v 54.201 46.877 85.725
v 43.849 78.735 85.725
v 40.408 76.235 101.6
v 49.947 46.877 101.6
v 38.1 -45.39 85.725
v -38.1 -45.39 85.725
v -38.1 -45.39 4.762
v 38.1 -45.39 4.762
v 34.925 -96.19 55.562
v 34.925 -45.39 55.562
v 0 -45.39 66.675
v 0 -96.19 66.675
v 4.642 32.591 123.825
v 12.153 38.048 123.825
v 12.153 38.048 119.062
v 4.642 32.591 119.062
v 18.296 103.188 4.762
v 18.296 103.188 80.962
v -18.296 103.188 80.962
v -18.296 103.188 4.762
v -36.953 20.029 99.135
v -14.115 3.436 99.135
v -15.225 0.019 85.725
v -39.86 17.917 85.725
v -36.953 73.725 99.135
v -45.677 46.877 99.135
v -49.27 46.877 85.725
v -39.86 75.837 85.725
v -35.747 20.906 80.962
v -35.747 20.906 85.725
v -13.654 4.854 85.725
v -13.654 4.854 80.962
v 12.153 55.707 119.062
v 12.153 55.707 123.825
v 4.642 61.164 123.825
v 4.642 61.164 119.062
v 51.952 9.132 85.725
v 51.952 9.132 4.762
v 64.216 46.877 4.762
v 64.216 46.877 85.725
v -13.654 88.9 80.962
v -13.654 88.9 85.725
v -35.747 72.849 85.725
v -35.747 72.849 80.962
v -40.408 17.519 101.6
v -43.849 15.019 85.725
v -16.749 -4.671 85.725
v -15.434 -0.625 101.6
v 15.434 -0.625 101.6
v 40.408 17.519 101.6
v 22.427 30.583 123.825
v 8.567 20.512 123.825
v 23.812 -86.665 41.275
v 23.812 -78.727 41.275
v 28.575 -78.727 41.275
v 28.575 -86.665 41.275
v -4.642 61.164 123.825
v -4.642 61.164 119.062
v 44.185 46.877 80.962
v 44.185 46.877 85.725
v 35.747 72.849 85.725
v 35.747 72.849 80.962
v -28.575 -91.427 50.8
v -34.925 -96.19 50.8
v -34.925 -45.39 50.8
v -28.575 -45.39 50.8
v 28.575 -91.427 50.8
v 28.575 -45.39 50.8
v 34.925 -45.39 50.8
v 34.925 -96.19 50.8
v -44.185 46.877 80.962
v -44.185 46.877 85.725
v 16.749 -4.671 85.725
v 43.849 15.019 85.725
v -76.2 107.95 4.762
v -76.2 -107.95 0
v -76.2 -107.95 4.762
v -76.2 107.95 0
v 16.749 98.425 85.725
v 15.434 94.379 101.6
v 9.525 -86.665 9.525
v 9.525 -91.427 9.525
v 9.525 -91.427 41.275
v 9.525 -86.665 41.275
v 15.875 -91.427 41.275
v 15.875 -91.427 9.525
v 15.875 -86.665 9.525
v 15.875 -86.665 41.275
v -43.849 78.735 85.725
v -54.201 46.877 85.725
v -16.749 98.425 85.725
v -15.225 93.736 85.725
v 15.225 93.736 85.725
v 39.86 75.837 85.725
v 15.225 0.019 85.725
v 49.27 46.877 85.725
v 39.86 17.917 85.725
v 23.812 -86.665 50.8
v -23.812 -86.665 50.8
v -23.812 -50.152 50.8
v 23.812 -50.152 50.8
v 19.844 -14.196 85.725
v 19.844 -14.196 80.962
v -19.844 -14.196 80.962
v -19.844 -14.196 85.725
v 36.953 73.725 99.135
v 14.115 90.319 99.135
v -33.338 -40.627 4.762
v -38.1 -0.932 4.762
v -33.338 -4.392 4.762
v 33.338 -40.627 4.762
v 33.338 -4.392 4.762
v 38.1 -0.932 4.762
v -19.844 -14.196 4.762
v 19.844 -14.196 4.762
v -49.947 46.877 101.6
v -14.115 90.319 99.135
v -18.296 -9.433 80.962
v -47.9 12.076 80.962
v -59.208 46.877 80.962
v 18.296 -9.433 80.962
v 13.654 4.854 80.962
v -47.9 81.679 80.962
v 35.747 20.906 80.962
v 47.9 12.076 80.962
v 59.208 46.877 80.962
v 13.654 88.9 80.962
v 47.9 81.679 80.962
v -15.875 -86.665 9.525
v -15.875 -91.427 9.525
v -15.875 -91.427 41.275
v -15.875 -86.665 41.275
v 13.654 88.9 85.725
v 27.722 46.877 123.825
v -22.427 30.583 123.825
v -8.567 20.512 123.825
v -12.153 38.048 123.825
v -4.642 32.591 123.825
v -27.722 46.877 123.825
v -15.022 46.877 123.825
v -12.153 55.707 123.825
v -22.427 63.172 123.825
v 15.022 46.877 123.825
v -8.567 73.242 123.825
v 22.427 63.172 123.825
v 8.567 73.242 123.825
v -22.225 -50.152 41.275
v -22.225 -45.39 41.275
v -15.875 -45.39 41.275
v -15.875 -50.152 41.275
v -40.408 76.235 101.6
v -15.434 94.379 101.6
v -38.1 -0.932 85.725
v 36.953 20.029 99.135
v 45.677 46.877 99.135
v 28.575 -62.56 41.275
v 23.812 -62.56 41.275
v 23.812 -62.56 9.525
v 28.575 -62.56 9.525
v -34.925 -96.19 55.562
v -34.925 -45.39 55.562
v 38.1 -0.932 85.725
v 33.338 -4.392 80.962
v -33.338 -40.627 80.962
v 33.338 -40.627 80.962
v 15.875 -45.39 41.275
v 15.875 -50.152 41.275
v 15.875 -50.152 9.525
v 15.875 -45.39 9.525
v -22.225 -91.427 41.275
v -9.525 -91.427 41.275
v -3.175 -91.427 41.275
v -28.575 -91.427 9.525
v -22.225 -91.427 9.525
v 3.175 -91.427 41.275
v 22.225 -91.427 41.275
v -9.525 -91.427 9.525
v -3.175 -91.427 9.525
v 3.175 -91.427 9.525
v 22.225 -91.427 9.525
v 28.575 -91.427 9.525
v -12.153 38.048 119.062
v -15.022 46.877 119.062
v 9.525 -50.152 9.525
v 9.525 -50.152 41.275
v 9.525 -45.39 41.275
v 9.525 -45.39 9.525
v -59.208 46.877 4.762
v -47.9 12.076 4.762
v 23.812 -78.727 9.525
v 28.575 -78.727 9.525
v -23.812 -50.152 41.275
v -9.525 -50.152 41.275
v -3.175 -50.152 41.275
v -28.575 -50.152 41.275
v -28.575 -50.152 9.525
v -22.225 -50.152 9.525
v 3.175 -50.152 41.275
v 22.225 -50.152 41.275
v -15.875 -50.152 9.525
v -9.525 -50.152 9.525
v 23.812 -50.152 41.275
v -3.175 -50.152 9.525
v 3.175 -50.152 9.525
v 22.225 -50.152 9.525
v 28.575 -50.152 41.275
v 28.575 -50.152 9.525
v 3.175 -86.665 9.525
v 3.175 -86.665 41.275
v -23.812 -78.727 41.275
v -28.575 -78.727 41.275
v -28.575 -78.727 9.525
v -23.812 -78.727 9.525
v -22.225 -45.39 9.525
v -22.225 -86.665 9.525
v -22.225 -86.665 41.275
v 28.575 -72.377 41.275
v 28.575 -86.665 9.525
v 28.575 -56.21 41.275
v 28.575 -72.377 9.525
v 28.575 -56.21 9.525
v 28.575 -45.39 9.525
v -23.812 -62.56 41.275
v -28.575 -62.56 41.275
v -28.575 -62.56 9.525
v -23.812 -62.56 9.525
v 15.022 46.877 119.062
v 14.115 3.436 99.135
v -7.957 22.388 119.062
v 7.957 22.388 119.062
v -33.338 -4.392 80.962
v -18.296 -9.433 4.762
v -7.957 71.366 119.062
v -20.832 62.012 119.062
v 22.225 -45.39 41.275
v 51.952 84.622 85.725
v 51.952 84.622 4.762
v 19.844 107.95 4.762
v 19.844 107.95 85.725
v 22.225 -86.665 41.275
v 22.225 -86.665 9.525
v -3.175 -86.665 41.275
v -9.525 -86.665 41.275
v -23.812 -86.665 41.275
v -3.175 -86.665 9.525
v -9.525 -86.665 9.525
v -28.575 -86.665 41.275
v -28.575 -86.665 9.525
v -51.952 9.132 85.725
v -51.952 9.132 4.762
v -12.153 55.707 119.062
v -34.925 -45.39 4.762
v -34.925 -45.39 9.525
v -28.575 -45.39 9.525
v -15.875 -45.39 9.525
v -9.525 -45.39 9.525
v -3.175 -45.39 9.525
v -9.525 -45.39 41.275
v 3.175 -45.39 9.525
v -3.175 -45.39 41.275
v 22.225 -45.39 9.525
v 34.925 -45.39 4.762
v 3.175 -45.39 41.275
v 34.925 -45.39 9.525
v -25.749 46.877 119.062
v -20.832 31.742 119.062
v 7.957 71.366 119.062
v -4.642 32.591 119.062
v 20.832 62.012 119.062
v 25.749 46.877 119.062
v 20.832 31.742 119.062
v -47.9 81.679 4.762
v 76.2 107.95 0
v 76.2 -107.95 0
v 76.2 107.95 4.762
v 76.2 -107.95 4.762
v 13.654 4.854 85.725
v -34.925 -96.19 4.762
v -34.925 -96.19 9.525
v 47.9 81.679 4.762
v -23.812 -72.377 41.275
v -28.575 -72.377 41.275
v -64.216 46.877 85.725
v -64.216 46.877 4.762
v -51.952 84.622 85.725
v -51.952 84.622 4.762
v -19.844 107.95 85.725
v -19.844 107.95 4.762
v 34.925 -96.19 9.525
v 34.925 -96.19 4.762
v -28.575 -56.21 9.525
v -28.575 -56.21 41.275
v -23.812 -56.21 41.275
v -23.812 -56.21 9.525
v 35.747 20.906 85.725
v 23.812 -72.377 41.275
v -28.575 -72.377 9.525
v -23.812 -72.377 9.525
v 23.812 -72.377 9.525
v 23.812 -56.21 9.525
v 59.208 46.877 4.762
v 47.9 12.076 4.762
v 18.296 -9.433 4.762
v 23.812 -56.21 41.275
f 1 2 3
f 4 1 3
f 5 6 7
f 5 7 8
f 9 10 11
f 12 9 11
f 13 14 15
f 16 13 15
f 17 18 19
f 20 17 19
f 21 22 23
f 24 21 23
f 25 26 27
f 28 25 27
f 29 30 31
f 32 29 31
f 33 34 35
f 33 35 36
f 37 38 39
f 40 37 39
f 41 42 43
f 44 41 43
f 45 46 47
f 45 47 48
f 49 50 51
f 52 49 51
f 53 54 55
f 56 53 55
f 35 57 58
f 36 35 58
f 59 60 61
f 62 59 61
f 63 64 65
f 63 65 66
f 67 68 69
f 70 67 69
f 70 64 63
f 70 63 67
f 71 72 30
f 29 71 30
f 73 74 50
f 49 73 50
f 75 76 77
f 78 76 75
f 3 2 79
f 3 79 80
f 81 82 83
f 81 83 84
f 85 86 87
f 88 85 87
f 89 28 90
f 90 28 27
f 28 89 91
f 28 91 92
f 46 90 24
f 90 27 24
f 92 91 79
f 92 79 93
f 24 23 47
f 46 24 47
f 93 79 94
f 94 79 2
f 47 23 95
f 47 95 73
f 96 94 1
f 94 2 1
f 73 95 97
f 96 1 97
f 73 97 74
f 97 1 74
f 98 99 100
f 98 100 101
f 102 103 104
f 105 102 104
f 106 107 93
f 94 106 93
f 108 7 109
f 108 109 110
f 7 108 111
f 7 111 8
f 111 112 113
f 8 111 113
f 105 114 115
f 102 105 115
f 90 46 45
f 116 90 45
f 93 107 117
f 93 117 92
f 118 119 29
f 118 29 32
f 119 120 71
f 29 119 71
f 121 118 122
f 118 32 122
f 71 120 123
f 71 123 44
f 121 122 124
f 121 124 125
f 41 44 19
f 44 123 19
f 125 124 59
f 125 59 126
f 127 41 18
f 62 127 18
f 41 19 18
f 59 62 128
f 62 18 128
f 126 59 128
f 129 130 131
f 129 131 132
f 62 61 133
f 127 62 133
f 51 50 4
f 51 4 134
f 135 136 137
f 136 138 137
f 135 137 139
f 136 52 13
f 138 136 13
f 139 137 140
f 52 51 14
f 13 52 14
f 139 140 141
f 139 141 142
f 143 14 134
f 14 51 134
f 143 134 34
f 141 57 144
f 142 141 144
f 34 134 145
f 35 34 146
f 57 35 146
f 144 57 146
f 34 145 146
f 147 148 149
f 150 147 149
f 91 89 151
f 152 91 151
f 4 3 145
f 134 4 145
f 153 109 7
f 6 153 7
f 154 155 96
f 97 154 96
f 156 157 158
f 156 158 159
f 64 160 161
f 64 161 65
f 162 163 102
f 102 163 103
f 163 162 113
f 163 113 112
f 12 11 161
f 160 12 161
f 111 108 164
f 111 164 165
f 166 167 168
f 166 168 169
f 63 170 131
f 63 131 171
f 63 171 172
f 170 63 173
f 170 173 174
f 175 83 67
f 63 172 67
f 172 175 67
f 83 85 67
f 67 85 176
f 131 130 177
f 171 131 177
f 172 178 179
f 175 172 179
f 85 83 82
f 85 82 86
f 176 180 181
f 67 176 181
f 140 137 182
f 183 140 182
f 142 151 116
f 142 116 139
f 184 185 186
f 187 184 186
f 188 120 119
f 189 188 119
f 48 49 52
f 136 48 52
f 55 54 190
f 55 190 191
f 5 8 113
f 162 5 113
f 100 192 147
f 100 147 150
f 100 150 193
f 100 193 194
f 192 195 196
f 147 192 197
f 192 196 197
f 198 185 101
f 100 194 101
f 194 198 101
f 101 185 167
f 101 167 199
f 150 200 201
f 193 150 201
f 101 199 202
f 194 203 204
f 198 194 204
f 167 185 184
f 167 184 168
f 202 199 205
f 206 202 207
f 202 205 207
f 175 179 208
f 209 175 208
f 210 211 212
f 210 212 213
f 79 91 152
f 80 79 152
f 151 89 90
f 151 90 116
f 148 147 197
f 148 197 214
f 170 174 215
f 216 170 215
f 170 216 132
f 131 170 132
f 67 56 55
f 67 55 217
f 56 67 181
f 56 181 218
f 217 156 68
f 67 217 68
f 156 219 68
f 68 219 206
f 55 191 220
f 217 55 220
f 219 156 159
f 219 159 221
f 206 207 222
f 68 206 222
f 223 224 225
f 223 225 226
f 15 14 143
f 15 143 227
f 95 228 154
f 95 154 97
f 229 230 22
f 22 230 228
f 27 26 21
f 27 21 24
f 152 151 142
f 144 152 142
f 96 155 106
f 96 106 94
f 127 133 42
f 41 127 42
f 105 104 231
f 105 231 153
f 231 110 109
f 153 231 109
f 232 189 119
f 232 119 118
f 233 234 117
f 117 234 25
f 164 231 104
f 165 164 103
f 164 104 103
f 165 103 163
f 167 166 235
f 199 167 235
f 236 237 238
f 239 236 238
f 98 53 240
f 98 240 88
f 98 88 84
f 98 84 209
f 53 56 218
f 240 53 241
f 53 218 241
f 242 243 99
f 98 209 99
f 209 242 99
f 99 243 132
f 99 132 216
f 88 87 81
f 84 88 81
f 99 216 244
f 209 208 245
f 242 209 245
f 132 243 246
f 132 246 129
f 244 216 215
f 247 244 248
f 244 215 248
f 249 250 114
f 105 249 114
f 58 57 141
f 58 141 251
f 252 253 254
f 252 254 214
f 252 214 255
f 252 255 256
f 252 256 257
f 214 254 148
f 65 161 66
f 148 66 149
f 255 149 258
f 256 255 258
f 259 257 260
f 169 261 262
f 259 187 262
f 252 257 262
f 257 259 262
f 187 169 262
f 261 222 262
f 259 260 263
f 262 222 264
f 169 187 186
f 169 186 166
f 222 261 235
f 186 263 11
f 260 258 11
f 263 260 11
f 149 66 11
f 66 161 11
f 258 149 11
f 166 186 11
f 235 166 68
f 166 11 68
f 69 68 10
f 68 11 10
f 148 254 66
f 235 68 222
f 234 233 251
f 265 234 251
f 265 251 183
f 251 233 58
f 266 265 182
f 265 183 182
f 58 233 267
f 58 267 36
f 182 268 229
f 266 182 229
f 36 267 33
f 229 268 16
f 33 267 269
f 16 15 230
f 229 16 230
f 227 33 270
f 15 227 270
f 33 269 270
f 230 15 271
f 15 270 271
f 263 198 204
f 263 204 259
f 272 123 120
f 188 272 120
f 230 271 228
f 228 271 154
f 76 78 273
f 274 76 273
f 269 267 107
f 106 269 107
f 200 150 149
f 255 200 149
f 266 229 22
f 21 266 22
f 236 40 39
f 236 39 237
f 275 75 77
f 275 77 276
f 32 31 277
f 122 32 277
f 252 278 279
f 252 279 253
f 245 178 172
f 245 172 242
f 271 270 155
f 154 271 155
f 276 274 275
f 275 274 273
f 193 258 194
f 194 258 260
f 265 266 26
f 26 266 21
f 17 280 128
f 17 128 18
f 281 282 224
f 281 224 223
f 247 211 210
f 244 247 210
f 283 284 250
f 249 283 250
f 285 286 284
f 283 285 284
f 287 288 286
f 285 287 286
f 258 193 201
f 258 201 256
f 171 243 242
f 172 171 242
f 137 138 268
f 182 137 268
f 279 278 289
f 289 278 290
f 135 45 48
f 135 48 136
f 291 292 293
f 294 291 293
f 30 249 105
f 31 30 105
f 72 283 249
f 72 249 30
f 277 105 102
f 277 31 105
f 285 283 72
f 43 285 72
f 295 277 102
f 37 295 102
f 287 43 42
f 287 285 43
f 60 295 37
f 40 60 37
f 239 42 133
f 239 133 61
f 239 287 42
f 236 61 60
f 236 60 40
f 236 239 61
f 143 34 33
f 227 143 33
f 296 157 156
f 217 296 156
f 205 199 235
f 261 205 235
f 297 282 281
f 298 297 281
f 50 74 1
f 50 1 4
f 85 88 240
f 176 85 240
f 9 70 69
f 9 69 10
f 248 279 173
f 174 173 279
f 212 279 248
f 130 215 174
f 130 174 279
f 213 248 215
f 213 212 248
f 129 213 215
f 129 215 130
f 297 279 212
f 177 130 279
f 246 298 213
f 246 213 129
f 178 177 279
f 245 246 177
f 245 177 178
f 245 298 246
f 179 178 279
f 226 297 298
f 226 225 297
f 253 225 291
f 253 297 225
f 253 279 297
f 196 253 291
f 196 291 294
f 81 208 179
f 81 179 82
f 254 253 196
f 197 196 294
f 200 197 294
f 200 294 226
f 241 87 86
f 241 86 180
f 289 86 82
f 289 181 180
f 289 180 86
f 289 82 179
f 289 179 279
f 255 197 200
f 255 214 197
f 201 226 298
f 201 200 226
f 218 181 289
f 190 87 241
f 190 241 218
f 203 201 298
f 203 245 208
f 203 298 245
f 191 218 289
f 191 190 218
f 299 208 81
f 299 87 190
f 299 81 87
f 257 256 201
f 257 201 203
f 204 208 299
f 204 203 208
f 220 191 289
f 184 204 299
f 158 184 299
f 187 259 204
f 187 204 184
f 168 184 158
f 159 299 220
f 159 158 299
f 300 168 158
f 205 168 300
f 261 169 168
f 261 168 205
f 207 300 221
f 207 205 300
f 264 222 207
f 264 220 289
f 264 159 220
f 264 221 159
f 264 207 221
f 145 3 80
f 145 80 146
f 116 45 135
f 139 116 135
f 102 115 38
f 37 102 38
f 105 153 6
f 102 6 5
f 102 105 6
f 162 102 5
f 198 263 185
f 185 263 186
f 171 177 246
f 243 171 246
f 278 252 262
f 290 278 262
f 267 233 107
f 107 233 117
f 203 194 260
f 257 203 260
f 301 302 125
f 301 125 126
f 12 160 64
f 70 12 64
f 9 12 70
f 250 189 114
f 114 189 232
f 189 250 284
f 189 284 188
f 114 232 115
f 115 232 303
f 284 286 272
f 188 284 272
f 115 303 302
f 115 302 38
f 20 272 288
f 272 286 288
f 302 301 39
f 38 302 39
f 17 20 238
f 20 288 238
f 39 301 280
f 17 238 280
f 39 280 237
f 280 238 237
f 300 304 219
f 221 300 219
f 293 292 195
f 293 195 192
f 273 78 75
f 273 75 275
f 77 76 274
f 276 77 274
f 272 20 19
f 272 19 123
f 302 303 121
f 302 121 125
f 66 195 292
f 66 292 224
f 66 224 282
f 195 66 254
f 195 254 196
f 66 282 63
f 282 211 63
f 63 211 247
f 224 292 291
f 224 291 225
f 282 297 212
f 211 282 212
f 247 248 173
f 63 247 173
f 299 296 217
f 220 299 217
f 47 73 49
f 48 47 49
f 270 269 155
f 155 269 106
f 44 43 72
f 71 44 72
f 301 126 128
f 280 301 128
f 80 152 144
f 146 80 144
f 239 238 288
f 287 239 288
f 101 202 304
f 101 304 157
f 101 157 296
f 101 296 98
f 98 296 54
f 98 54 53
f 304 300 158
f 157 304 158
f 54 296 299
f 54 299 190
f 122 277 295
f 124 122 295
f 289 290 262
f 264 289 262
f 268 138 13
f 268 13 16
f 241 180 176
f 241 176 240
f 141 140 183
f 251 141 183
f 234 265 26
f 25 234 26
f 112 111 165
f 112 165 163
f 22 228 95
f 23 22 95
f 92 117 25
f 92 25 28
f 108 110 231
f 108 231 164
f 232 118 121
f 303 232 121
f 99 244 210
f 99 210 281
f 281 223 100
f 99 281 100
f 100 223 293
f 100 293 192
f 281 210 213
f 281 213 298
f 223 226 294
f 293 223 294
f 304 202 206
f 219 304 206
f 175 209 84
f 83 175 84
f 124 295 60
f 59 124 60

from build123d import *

# Parameters (mm, degrees)
F0_W      = 152.4
F0_H      = 215.9
F1_DEPTH  = 4.7625
F2_W      = 69.85
F2_H      = 50.8
F3_DEPTH  = 4.7625
F4_W      = 6.35
F4_H      = 4.7625
F4_W_2    = 4.7625
F4_H_2    = 6.35
F5_DEPTH  = 31.75
F7_DEPTH  = 9.525
F9_DEPTH  = 50.8
F11_DEPTH = 80.9625
F13_DEPTH = 80.9625
F14_T     = -4.7625
F15_T     = -4.7625
F17_DEPTH = 85.726


with BuildPart() as f1:
    # F0 (on Top) → F1 (new body)
    with BuildSketch(Plane.XY):
        Rectangle(F0_W, F0_H)
    extrude(amount=F1_DEPTH)


with BuildPart() as f3:
    # F2 (on face) → F3 (new body)
    with BuildSketch(Plane.XY.offset(4.7625)):
        with Locations((0, -70.7898)):
            Rectangle(F2_W, F2_H)
    extrude(amount=F3_DEPTH)

    # F4 (on face) → F5 (join)
    with BuildSketch(Plane.XY.offset(9.525)):
        with Locations((-25.4, -47.77105)):
            Rectangle(F4_W, F4_H)
        with Locations((-12.7, -47.77105)):
            Rectangle(F4_W, F4_H)
        with Locations((0, -47.77105)):
            Rectangle(F4_W, F4_H)
        with Locations((12.7, -47.77105)):
            Rectangle(F4_W, F4_H)
        with Locations((25.4, -47.77105)):
            Rectangle(F4_W, F4_H)
        with Locations((26.19375, -59.3852)):
            Rectangle(F4_W_2, F4_H_2)
        with Locations((26.19375, -75.5523)):
            Rectangle(F4_W_2, F4_H_2)
        with Locations((25.4, -89.04605)):
            Rectangle(F4_W, F4_H)
        with Locations((12.7, -89.04605)):
            Rectangle(F4_W, F4_H)
        with Locations((0, -89.04605)):
            Rectangle(F4_W, F4_H)
        with Locations((-12.7, -89.04605)):
            Rectangle(F4_W, F4_H)
        with Locations((-25.4, -89.04605)):
            Rectangle(F4_W, F4_H)
        with Locations((-26.19375, -75.5523)):
            Rectangle(F4_W_2, F4_H_2)
        with Locations((-26.19375, -59.3852)):
            Rectangle(F4_W_2, F4_H_2)
    extrude(amount=F5_DEPTH)

    # F6 (on face) → F7 (join)
    with BuildSketch(Plane.XY.offset(41.275)):
        Polygon((28.575, -45.3898), (-28.575, -45.3898), (-28.575, -50.1523), (-23.8125, -50.1523), (-22.225, -50.1523), (23.8125, -50.1523), (23.8125, -86.6648), (28.575, -86.6648), align=None)
        Polygon((-23.8125, -50.1523), (-28.575, -50.1523), (-28.575, -91.4273), (28.575, -91.4273), (28.575, -86.6648), (23.8125, -86.6648), (22.225, -86.6648), (-23.8125, -86.6648), align=None)
    extrude(amount=F7_DEPTH)

    # F8 (on face) → F9 (join, through all)
    with BuildSketch(Plane.XZ.offset(96.1898)):
        Polygon((-34.925, 50.8), (-28.575, 50.8), (28.575, 50.8), (34.925, 50.8), (34.925, 55.5625), (0, 66.675), (-34.925, 55.5625), align=None)
    extrude(amount=-F9_DEPTH)


with BuildPart() as f11:
    # F10 (on face) → F11 (new body)
    with BuildSketch(Plane.XY.offset(4.7625)):
        Polygon((19.84375, 107.95), (-19.84375, 107.95), (-51.9516119643, 84.6222727996), (-64.2157239285, 46.8772173092), (-51.9516119643, 9.1321618187), (-19.84375, -14.1955653816), (19.84375, -14.1955653816), (51.9516119643, 9.1321618187), (64.2157239285, 46.8772173092), (51.9516119643, 84.6222727996), align=None)
    extrude(amount=F11_DEPTH)

    # F14
    f14_openings = [f11.faces().sort_by_distance(p)[0] for p in [
        (0, 46.877217, 4.7625),
    ]]
    offset(amount=F14_T, openings=f14_openings)

    # F16 (on face) → F17 (cut, through all)
    with BuildSketch(Plane.XY.offset(85.725)):
        Polygon((35.7467140651, 20.9057093044), (44.1853685568, 46.8772173092), (35.7467140651, 72.848725314), (13.6540297868, 88.9), (-13.6540297868, 88.9), (-35.7467140651, 72.848725314), (-44.1853685568, 46.8772173092), (-35.7467140651, 20.9057093044), (-13.6540297868, 4.8544346184), (13.6540297868, 4.8544346184), align=None)
    extrude(amount=-F17_DEPTH, mode=Mode.SUBTRACT)


with BuildPart() as f13:
    # F12 (on face) → F13 (new body)
    with BuildSketch(Plane.XY.offset(4.7625)):
        Polygon((19.84375, -14.1955653816), (-19.84375, -14.1955653816), (-38.1, -0.9316233547), (-38.1, -45.3898), (38.1, -45.3898), (38.1, -0.9316233547), align=None)
    extrude(amount=F13_DEPTH)

    # F15
    f15_openings = [f13.faces().sort_by_distance(p)[0] for p in [
        (0, -27.941907, 4.7625),
        (0, -14.195565, 45.24375),
        (28.971875, -7.563594, 45.24375),
        (-28.971875, -7.563594, 45.24375),
    ]]
    offset(amount=F15_T, openings=f15_openings)


with BuildPart() as f21:
    # F21: sweep along a path in F18
    with BuildLine(Plane.XY.offset(85.725)) as f21_path:
        Line((16.7488898934, -4.6705653816), (43.8491630147, 15.0189355616))
        Line((43.8491630147, 15.0189355616), (54.2005462426, 46.8772173092))
        Line((54.2005462426, 46.8772173092), (43.8491630147, 78.7354990568))
        Line((43.8491630147, 78.7354990568), (16.7488898934, 98.425))
        Line((16.7488898934, 98.425), (-16.7488898934, 98.425))
        Line((-16.7488898934, 98.425), (-43.8491630147, 78.7354990568))
        Line((-43.8491630147, 78.7354990568), (-54.2005462426, 46.8772173092))
        Line((-54.2005462426, 46.8772173092), (-43.8491630147, 15.0189355616))
        Line((-43.8491630147, 15.0189355616), (-16.7488898934, -4.6705653816))
        Line((-16.7488898934, -4.6705653816), (16.7488898934, -4.6705653816))
    # F20 (on mid) → F21 (sweep)
    with BuildSketch(Plane(origin=(13.7768685014, 4.4763759285, 0), x_dir=(0.3090169944, -0.9510565163, 0), z_dir=(-0.9510565163, -0.3090169944, 0))):
        Polygon((1.0940291389, 99.1347485954), (4.6871604458, 85.725), (9.617663255, 85.725), (5.3639698251, 101.6), (-16.8610301749, 123.825), (-29.5610301749, 123.825), (-29.5610301749, 119.0625), (-18.8337222657, 119.0625), align=None)
    sweep(path=f21_path.line, transition=Transition.RIGHT)


solid = Compound([f1.part, f3.part, f11.part, f13.part, f21.part])
